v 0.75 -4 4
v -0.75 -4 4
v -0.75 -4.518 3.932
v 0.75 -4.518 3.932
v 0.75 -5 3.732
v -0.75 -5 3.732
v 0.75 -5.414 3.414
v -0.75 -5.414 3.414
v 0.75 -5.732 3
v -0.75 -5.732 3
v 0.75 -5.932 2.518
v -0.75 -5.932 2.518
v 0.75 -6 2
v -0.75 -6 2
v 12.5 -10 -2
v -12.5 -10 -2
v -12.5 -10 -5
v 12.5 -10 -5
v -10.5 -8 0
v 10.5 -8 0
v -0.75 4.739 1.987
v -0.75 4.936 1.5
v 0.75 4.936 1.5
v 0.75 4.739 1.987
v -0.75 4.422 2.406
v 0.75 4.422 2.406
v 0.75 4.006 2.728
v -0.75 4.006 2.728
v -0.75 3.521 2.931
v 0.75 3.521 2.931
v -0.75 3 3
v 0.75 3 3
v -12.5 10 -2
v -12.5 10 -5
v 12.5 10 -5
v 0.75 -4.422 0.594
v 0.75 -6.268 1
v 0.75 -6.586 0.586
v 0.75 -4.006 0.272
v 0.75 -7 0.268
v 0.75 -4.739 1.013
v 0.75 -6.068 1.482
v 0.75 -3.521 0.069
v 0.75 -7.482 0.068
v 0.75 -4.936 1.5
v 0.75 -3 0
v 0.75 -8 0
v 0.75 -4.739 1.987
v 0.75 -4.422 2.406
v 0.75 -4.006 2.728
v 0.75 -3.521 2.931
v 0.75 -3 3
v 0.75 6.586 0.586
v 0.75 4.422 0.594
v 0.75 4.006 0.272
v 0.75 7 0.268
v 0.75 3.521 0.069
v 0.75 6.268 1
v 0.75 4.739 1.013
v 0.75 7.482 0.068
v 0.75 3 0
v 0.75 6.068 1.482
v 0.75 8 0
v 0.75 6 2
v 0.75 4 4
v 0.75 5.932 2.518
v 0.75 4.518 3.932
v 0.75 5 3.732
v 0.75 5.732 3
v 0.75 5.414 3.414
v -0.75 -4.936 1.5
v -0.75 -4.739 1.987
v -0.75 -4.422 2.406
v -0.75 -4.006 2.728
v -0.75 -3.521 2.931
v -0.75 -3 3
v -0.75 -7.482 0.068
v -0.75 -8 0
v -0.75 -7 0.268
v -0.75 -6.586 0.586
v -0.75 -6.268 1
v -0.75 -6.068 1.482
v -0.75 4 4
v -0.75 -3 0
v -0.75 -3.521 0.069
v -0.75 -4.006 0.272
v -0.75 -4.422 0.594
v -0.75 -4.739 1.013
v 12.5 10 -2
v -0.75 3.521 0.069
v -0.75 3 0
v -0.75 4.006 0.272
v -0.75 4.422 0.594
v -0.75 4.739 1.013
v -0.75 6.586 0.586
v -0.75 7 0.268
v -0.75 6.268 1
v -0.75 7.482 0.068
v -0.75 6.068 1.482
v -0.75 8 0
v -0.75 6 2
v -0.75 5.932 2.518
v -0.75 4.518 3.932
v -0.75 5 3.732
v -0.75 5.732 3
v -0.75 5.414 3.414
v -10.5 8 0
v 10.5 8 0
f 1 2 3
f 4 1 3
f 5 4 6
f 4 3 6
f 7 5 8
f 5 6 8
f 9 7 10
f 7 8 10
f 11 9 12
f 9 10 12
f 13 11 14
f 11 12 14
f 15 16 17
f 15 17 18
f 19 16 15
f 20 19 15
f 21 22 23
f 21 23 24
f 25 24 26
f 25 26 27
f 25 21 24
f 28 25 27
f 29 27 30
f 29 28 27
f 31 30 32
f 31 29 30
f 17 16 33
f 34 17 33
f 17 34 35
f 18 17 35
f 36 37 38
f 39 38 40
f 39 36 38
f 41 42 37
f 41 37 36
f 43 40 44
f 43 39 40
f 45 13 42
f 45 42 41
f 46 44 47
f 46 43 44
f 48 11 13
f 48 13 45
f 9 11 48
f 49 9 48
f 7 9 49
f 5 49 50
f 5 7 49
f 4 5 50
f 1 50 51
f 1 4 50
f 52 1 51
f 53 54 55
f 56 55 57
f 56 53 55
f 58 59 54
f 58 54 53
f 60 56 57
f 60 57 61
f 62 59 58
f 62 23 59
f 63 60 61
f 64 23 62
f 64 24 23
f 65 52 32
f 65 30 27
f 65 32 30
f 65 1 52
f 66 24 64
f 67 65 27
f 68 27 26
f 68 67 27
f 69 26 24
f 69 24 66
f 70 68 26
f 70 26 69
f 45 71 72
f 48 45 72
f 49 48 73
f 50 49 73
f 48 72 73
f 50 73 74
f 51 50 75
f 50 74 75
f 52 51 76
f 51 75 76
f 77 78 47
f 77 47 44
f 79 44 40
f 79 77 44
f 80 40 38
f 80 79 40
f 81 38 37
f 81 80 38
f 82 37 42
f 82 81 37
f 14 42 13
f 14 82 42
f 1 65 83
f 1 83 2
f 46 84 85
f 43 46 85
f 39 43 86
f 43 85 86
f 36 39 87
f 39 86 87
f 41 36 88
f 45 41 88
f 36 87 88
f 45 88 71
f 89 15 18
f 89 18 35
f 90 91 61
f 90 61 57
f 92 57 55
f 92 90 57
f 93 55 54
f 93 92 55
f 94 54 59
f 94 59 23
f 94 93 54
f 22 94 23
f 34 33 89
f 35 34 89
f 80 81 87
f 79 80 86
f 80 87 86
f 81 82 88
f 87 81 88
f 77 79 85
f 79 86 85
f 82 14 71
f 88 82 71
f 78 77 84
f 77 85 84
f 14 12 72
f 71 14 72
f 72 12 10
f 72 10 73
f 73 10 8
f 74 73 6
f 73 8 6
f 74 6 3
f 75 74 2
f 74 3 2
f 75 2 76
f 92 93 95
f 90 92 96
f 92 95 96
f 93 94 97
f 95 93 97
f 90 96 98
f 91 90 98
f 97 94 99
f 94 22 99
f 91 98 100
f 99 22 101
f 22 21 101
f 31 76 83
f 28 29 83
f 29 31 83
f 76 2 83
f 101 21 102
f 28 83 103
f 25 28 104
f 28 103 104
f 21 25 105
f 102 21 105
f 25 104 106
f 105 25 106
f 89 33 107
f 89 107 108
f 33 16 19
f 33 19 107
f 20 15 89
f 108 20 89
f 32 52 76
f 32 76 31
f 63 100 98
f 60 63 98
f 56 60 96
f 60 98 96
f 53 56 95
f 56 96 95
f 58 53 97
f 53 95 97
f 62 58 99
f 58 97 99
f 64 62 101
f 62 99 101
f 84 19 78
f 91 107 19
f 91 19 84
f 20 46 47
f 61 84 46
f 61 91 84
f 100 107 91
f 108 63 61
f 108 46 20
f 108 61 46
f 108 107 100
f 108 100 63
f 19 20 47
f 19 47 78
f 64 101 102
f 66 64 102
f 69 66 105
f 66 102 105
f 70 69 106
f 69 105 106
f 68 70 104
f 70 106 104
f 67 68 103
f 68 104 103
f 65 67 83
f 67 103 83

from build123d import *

# Parameters (mm, degrees)
F0_W        = 25
F0_H        = 20
F1_DEPTH    = 5
F3_DEPTH    = 0.75
F4_T1_DEPTH = 1.5
F4_T3_DEPTH = 11.5
F5_SIZE     = 1.99999


# Not quite as in the source:
# - a fillet or chamfer that OpenCascade refuses, or shapes differently, is made with other operations: its cross-section is extruded or revolved along the edge and cut away or added
# - a fillet or chamfer is up to 0.001 mm smaller than in the source, because OpenCascade refuses the exact size


with BuildPart() as f1:
    # F0 (on Top) → F1 (new body)
    with BuildSketch(Plane.XY):
        Rectangle(F0_W, F0_H)
    extrude(amount=-F1_DEPTH)

    # F2 (on Right) → F3 (join, symmetric)
    with BuildSketch(Plane.YZ):
        Polygon((-6, 4), (-6, 0), (-5, 0), (-5, 3), (5, 3), (5, 0), (6, 0), (6, 4), align=None)
    extrude(amount=F3_DEPTH, both=True)

    # F4: fillet of radius 2 on 8 edges, made by hand

    # F4_s2 → F4_t1 (join)
    with BuildSketch(Plane.YZ.offset(-0.75)):
        with BuildLine():
            ThreePointArc((-3, 0), (-4.4142135624, 0.5857864376), (-5, 2))
            Line((-5, 2), (-5, 0))
            Line((-5, 0), (-3, 0))
        make_face()
        with BuildLine():
            ThreePointArc((3, 0), (4.4142135624, 0.5857864376), (5, 2))
            Line((5, 2), (5, 0))
            Line((5, 0), (3, 0))
        make_face()
        with BuildLine():
            ThreePointArc((-8, 0), (-6.5857864376, 0.5857864376), (-6, 2))
            Line((-6, 2), (-6, 0))
            Line((-6, 0), (-8, 0))
        make_face()
        with BuildLine():
            ThreePointArc((8, 0), (6.5857864376, 0.5857864376), (6, 2))
            Line((6, 2), (6, 0))
            Line((6, 0), (8, 0))
        make_face()
        with BuildLine():
            ThreePointArc((-5, 1), (-4.4142135624, 2.4142135624), (-3, 3))
            Line((-3, 3), (-5, 3))
            Line((-5, 3), (-5, 1))
        make_face()
        with BuildLine():
            ThreePointArc((5, 1), (4.4142135624, 2.4142135624), (3, 3))
            Line((3, 3), (5, 3))
            Line((5, 3), (5, 1))
        make_face()
    extrude(amount=F4_T1_DEPTH)

    # F4_s4 → F4_t3 (cut)
    with BuildSketch(Plane.YZ.offset(-5.75)):
        with BuildLine():
            ThreePointArc((-4, 4), (-5.4142135624, 3.4142135624), (-6, 2))
            Line((-6, 2), (-6, 4))
            Line((-6, 4), (-4, 4))
        make_face()
        with BuildLine():
            ThreePointArc((6, 2), (5.4142135624, 3.4142135624), (4, 4))
            Line((4, 4), (6, 4))
            Line((6, 4), (6, 2))
        make_face()
    extrude(amount=F4_T3_DEPTH, mode=Mode.SUBTRACT)

    # F5 (size 2 in the source; OpenCascade refuses exactly that, so slightly less here)
    f5_edges = [f1.edges().sort_by_distance(p)[0] for p in [
        (12.5, 0, 0),
        (0, -10, 0),
        (0, 10, 0),
        (-12.5, 0, 0),
    ]]
    chamfer(f5_edges, length=F5_SIZE)


solid = f1.part
